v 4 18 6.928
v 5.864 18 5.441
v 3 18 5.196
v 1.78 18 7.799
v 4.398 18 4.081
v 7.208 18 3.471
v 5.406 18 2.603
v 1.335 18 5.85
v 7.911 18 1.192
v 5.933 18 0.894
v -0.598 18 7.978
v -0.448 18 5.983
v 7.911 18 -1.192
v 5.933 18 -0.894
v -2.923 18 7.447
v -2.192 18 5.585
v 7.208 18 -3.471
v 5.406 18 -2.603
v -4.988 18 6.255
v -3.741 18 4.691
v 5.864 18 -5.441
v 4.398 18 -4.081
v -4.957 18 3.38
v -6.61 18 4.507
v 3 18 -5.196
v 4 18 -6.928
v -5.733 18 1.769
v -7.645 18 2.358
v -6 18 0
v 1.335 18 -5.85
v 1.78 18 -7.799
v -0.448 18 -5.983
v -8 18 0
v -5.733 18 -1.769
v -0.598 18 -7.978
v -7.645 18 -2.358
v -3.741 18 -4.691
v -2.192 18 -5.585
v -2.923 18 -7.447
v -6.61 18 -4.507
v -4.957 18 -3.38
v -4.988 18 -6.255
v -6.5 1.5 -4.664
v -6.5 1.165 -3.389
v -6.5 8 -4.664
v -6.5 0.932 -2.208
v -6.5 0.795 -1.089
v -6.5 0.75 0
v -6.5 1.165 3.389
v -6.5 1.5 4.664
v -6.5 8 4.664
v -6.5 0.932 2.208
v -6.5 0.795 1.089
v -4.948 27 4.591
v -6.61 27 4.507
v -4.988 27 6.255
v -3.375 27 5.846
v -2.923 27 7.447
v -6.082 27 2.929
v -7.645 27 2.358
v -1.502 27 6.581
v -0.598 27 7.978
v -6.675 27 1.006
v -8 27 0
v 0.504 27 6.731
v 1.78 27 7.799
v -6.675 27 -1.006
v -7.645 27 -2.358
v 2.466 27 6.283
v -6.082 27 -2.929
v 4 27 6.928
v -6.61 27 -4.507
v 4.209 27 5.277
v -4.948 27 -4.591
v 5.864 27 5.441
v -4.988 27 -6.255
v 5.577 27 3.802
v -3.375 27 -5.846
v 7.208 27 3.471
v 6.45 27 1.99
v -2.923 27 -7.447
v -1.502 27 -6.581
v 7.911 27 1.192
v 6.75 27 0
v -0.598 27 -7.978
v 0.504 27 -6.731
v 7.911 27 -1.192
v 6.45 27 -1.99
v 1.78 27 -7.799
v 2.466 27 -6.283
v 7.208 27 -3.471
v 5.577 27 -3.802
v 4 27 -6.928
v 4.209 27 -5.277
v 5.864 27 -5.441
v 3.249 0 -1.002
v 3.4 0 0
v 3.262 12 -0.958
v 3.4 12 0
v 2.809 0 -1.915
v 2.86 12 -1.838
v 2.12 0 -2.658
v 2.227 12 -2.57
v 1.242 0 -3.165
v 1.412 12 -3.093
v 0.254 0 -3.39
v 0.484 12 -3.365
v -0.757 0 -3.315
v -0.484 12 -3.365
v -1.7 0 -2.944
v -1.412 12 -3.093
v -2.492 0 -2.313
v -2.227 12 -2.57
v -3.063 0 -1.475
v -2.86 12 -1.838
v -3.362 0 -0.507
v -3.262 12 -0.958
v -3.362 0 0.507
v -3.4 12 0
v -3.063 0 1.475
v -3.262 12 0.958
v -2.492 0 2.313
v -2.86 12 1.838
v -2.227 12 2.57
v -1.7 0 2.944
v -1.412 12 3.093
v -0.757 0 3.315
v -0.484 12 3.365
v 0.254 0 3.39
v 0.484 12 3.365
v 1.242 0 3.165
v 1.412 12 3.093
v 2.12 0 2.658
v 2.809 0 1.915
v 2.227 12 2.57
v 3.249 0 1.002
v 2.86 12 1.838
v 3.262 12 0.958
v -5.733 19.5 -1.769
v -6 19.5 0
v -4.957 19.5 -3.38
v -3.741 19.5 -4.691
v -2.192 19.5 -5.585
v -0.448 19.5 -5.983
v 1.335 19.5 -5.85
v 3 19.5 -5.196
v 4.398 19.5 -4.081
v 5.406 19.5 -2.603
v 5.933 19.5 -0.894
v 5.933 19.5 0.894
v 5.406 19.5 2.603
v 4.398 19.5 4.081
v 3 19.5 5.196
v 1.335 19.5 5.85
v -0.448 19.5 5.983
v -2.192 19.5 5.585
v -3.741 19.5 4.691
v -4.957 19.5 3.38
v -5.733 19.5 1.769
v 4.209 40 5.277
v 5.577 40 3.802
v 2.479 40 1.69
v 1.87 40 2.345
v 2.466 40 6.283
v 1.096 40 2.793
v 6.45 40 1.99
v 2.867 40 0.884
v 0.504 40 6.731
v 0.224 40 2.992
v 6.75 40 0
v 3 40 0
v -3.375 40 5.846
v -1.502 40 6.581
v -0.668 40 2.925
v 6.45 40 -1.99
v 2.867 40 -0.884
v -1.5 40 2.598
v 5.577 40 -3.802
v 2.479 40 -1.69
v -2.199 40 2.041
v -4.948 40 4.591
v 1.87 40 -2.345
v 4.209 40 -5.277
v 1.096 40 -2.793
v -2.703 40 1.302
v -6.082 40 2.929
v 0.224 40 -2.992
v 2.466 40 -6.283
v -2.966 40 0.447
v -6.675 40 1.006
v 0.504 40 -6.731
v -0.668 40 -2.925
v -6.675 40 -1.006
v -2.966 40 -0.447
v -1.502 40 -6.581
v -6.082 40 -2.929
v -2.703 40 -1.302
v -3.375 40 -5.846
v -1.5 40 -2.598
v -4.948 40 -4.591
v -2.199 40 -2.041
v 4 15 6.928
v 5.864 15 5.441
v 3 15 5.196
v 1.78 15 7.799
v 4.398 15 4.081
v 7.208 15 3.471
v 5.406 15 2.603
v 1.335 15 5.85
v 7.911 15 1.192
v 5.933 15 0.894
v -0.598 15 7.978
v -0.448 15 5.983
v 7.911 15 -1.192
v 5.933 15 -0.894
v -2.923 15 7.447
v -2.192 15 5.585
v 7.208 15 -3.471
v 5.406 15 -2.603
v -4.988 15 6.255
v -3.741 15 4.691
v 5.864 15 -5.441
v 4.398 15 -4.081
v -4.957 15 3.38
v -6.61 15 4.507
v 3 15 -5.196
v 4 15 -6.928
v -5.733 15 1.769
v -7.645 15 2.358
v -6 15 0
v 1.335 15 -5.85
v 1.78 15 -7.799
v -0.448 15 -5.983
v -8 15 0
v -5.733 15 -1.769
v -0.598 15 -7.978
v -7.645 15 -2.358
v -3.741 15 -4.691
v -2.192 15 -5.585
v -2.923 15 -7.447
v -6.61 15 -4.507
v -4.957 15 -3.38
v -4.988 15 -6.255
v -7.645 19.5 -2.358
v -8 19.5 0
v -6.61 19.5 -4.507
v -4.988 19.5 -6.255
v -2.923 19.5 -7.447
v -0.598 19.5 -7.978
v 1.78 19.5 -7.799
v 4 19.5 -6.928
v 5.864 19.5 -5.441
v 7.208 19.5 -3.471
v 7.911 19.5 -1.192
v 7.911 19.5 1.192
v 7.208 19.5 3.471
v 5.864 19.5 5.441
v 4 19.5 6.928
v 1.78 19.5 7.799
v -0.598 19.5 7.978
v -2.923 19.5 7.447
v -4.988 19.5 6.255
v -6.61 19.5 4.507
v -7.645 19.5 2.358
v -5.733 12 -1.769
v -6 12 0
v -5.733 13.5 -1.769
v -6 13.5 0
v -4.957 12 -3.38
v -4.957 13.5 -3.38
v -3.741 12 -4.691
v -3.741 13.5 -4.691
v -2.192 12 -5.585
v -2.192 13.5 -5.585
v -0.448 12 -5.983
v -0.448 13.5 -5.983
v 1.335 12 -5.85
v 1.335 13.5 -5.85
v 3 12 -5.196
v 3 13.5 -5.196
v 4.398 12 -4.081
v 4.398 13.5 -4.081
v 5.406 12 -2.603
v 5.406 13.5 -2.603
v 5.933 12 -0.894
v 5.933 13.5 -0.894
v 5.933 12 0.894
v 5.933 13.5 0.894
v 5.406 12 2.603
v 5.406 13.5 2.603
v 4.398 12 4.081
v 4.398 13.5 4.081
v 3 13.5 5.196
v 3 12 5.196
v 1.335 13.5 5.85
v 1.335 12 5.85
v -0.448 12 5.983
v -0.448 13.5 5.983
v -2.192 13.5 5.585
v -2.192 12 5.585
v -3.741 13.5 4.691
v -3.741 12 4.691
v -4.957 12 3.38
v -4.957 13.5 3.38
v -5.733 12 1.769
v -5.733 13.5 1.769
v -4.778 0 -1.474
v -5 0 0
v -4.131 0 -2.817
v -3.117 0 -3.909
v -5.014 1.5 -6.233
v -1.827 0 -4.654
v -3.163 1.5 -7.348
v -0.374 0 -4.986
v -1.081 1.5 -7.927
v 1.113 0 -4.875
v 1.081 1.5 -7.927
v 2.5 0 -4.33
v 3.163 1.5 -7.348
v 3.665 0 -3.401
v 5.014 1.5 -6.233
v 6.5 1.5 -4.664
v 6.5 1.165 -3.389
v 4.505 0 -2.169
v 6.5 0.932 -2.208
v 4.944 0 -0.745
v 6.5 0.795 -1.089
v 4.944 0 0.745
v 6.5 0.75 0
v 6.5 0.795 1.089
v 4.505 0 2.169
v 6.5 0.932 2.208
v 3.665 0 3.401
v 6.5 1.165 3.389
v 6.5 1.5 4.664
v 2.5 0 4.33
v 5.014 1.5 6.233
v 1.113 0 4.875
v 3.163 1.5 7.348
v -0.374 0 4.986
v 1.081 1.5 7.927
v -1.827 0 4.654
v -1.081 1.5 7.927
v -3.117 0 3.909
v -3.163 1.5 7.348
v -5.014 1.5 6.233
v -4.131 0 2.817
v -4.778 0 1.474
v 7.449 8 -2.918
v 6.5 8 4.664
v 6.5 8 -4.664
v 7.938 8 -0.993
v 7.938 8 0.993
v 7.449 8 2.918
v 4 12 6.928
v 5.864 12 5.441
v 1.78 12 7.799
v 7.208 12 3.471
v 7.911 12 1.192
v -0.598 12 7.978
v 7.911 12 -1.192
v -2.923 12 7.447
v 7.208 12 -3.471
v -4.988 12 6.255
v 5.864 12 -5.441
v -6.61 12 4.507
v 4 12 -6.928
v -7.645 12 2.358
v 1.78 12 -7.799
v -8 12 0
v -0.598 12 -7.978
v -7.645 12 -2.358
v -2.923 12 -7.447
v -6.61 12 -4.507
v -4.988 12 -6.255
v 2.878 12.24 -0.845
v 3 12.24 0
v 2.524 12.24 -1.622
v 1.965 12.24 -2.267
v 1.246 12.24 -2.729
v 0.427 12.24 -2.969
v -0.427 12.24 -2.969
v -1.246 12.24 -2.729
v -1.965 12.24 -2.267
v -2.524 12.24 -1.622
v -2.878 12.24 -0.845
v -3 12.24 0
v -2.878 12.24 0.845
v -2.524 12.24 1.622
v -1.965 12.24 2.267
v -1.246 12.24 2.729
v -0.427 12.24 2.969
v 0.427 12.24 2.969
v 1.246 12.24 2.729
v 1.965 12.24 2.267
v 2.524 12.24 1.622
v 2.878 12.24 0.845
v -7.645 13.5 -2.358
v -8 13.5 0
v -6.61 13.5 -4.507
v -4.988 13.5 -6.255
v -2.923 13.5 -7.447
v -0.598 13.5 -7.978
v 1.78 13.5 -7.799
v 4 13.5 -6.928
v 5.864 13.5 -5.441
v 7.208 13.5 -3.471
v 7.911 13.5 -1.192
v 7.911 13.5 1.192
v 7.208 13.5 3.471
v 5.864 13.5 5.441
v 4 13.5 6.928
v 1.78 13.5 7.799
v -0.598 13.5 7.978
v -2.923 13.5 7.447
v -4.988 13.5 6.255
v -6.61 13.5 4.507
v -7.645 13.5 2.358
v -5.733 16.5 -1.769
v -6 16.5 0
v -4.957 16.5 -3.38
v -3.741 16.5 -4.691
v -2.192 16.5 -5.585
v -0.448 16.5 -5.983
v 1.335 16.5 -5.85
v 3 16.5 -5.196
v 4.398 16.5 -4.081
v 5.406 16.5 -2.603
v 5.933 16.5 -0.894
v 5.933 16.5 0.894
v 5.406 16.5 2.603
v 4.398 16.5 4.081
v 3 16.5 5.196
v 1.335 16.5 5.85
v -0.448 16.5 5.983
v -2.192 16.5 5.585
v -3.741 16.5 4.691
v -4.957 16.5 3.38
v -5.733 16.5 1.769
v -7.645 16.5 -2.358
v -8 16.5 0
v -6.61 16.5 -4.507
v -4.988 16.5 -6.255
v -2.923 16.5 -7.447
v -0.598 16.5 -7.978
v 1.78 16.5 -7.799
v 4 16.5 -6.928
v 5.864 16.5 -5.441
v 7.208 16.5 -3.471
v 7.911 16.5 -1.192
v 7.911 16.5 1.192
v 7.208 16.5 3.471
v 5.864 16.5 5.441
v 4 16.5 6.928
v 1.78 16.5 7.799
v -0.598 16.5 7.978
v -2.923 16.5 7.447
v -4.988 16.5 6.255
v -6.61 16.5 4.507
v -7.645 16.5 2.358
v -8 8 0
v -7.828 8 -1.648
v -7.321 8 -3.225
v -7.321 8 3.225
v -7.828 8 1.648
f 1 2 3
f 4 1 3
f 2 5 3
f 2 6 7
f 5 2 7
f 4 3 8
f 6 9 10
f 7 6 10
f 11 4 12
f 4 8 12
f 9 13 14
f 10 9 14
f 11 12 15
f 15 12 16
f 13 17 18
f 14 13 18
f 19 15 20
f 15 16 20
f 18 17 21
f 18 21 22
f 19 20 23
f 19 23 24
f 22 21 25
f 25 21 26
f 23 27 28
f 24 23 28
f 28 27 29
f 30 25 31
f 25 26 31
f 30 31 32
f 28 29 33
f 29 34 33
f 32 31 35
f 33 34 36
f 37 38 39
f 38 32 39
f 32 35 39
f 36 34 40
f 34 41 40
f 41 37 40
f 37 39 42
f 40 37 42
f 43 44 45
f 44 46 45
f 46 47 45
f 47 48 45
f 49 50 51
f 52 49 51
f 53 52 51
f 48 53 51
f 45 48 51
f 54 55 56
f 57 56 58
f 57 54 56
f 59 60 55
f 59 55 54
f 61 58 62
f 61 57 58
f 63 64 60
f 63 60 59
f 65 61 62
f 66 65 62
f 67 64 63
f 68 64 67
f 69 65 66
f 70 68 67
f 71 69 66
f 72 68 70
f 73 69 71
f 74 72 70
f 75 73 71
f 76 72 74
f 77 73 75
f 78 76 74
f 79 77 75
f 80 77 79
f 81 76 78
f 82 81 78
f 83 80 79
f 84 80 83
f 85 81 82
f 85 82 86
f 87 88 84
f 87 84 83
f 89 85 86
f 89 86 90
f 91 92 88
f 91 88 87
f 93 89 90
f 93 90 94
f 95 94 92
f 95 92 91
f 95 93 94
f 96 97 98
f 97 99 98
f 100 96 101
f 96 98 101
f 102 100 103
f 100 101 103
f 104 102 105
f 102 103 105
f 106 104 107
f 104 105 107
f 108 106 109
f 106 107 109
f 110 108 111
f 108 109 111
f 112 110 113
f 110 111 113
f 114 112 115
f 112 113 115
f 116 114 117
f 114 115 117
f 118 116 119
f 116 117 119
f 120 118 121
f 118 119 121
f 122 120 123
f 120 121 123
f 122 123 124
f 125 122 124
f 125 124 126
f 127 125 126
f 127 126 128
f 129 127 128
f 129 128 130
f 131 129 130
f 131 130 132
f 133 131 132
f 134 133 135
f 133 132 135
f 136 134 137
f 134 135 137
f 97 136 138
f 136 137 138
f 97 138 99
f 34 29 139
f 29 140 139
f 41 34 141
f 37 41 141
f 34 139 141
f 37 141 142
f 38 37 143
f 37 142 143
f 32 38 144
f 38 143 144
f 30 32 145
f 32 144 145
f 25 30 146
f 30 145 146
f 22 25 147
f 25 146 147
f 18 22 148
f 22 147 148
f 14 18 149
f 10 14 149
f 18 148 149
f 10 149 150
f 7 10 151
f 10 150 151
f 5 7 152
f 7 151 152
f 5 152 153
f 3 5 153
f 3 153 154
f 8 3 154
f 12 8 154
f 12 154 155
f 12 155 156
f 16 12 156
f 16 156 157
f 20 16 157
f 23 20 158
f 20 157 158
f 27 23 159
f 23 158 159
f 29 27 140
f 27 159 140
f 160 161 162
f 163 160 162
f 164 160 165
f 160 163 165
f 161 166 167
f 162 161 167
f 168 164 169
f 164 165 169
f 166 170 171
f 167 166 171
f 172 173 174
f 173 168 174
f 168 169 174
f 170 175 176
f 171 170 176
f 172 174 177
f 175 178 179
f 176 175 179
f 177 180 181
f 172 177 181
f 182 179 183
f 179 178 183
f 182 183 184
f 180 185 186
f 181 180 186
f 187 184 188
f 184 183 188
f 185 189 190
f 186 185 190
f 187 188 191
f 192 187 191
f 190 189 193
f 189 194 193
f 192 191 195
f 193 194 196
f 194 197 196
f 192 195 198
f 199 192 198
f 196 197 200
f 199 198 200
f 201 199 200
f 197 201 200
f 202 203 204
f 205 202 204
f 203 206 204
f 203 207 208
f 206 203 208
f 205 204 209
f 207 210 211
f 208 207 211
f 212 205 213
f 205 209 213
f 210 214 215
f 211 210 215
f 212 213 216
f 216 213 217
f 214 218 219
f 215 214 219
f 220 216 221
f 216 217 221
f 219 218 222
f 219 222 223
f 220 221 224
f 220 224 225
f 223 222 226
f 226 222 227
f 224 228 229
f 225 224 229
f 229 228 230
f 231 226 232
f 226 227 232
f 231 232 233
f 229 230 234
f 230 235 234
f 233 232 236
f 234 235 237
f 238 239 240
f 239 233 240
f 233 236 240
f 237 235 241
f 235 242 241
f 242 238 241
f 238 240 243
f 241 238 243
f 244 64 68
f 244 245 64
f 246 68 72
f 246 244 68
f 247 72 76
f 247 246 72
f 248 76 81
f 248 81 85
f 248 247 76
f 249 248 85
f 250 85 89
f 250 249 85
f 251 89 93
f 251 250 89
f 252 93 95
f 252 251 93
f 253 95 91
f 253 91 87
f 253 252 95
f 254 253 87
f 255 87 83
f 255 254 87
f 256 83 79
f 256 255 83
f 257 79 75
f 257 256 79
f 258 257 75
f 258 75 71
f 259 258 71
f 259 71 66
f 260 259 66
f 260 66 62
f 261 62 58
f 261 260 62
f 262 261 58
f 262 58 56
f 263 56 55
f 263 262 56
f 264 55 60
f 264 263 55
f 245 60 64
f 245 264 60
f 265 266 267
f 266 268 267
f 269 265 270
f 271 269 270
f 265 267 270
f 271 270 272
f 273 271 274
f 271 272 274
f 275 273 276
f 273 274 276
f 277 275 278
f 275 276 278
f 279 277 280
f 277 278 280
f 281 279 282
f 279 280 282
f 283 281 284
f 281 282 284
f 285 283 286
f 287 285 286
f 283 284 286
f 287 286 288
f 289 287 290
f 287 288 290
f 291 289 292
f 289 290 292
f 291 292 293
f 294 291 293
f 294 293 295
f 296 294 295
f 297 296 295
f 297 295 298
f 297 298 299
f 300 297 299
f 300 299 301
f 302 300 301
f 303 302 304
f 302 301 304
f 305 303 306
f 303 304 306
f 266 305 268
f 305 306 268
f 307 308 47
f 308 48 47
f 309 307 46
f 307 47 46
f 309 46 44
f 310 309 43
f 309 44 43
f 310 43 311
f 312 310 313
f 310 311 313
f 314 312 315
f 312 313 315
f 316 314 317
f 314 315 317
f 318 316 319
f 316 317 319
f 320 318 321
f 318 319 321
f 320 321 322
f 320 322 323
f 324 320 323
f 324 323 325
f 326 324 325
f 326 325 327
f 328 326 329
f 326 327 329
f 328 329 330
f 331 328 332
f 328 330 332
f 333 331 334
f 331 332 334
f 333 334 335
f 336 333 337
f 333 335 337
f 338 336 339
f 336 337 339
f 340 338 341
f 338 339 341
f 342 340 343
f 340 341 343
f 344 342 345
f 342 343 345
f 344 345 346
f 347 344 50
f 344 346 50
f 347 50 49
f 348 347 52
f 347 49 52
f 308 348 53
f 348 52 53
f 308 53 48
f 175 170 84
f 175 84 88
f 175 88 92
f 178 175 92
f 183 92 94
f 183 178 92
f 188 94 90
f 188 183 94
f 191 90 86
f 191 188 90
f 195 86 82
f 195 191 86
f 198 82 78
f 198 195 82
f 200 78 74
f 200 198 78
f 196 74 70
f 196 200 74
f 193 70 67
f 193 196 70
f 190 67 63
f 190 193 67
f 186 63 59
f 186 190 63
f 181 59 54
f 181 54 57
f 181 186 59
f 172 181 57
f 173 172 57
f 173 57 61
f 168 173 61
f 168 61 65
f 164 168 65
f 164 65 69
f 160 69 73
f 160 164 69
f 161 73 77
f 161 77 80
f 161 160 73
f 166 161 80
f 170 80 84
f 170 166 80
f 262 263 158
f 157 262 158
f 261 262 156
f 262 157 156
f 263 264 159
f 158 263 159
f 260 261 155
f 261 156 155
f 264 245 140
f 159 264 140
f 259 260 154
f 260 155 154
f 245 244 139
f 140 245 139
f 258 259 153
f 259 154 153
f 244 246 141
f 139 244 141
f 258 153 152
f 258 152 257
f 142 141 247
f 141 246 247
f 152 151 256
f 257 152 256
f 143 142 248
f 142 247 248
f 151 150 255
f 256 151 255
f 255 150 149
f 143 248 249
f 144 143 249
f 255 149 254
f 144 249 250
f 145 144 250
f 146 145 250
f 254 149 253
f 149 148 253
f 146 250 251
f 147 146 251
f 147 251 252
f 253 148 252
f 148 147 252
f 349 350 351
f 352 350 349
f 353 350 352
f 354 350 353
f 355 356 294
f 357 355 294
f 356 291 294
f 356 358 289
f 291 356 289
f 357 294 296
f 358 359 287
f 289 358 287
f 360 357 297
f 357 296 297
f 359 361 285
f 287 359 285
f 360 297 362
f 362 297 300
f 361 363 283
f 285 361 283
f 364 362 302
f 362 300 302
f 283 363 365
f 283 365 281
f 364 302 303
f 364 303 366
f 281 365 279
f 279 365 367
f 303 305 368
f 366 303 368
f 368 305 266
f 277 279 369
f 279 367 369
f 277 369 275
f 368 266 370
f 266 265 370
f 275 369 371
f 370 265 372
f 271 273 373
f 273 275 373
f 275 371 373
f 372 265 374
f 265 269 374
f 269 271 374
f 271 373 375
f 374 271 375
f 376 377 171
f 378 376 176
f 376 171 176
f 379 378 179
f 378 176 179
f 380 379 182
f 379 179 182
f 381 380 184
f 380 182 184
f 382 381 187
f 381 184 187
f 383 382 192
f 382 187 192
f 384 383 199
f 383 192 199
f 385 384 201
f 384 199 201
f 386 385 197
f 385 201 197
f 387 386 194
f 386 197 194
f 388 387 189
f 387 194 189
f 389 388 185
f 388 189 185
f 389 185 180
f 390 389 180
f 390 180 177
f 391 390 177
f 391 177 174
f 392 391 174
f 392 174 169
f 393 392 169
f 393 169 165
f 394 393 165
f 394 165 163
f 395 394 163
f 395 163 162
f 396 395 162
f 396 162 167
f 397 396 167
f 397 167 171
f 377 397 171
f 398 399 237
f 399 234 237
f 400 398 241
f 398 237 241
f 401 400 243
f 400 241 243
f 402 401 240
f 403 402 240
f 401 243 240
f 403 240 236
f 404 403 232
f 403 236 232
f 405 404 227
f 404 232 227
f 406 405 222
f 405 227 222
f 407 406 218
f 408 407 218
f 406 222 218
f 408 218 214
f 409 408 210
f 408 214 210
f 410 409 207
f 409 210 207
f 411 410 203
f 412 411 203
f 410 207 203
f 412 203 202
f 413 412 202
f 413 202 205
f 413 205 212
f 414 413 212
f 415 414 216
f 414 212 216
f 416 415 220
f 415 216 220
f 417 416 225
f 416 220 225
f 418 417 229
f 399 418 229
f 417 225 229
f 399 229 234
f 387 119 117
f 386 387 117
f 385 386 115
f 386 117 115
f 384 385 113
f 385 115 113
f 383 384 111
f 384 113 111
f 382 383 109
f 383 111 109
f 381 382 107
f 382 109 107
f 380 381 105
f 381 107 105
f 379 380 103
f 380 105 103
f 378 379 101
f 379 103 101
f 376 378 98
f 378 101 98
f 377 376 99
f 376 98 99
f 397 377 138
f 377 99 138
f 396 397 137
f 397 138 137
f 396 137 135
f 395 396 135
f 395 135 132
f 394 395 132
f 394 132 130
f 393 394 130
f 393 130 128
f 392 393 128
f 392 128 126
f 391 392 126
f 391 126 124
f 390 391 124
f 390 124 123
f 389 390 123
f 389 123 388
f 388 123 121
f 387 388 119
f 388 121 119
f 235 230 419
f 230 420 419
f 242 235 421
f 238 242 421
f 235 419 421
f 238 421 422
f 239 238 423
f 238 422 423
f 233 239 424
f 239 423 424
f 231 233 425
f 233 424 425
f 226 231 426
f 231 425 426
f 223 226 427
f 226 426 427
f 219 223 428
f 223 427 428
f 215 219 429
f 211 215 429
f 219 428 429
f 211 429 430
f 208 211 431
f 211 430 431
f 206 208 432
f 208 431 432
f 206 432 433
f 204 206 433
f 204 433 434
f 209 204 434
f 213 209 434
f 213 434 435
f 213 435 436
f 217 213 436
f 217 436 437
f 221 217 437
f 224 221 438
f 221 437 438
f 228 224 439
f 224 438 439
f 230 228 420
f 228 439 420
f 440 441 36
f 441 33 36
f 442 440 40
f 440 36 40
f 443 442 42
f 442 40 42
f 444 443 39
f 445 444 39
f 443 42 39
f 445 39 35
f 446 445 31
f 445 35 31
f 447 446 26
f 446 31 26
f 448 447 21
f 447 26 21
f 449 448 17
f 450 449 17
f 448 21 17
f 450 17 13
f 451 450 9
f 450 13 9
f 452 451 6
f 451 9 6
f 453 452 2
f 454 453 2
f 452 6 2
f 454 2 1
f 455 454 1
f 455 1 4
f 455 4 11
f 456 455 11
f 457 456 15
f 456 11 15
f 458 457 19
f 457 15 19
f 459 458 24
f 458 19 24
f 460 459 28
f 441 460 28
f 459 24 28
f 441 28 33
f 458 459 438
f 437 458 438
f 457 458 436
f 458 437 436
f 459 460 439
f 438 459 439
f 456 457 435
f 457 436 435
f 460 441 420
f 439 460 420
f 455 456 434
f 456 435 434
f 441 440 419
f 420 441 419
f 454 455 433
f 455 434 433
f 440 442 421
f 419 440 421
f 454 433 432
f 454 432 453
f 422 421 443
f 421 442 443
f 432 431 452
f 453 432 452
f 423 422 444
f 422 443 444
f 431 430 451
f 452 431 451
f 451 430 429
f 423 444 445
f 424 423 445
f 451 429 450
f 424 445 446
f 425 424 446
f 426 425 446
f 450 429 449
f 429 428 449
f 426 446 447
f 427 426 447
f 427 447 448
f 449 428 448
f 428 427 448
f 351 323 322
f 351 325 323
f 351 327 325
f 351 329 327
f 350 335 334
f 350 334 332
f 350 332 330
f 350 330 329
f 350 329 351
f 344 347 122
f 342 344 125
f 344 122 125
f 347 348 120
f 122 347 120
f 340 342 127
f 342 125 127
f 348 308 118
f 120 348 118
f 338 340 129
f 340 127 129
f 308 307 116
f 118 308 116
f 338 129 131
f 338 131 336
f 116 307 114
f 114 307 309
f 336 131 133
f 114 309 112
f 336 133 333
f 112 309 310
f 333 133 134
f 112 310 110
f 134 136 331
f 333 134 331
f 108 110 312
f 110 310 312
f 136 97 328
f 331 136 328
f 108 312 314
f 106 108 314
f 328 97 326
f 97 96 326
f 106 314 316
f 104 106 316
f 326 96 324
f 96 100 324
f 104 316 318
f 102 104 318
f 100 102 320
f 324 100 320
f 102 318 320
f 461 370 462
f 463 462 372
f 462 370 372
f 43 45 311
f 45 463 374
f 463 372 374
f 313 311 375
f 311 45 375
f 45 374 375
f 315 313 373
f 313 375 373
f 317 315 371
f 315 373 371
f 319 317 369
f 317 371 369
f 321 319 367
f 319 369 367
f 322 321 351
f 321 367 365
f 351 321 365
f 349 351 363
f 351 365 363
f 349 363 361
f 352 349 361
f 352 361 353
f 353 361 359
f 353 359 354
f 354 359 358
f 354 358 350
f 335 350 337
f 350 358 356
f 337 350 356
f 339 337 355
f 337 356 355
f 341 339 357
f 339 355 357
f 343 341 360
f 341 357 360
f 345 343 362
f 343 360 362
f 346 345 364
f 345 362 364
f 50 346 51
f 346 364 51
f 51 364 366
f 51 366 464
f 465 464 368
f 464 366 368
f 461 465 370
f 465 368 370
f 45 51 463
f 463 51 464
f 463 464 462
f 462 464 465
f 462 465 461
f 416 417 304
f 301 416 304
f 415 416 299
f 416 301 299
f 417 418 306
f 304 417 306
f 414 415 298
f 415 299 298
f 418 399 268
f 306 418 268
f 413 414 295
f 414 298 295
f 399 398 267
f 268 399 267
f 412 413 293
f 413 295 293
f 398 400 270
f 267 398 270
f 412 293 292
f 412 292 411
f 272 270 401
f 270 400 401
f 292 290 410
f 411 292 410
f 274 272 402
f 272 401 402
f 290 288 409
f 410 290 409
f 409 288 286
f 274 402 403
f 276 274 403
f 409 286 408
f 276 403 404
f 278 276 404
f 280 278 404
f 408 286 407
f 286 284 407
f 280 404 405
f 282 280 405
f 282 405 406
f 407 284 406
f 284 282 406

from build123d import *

# Parameters (mm, degrees)
TAGLIO_ESTRUSIONE1_REACH             = 10
SCHIZZO2_W                           = 1.5
SCHIZZO2_H                           = 8
TAGLIO_ESTRUSIONE1_DIRECTION_2_REACH = 10
SCHIZZO7_R                           = 3
TAGLIO_ESTRUSIONE2_DEPTH             = 41
FORO_FILETTATO_M8_1_D                = 6.8
FORO_FILETTATO_M8_1_DEPTH            = 12
FORO_FILETTATO_M8_1_TIP              = 2.042926105
SCHIZZO10_OUTSIDE_W                  = 27.192
SCHIZZO10_OUTSIDE_H                  = 27.192
SCHIZZO10_OUTSIDE_R                  = 6.75
TAGLIO_ESTRUSIONE3_DEPTH             = 13


with BuildPart() as part:
    # Schizzo1 → Rivoluzione1 (revolve)
    with BuildSketch(Plane.XY):
        Polygon((0, 0), (-5, 0), (-8, 1.5), (-8, 12), (-6, 12), (-6, 13.5), (-8, 13.5), (-8, 15), (-6, 15), (-6, 16.5), (-8, 16.5), (-8, 18), (-6, 18), (-6, 19.5), (-8, 19.5), (-8, 27), (-8, 40), (0, 40), align=None)
    revolve(axis=Axis((0, 129.407380346, 0), (0, -1, 0)))

    # Schizzo2 → Taglio-Estrusione1 (cut, up to next)
    with BuildSketch(Plane.XY, mode=Mode.PRIVATE) as taglio_estrusione1_sk1:
        with Locations((-7.25, 4)):
            Rectangle(SCHIZZO2_W, SCHIZZO2_H)
    taglio_estrusione1_tool1 = extrude(taglio_estrusione1_sk1.sketch, amount=-TAGLIO_ESTRUSIONE1_REACH, mode=Mode.PRIVATE) & part.part
    add(taglio_estrusione1_tool1.solids().sort_by_distance((-7.25, 4, 0))[0], mode=Mode.SUBTRACT)
    # Schizzo2 → Taglio-Estrusione1 (cut, up to next)
    with BuildSketch(Plane.XY, mode=Mode.PRIVATE) as taglio_estrusione1_sk2:
        with Locations((7.25, 4)):
            Rectangle(SCHIZZO2_W, SCHIZZO2_H)
    taglio_estrusione1_tool2 = extrude(taglio_estrusione1_sk2.sketch, amount=-TAGLIO_ESTRUSIONE1_REACH, mode=Mode.PRIVATE) & part.part
    add(taglio_estrusione1_tool2.solids().sort_by_distance((7.25, 4, 0))[0], mode=Mode.SUBTRACT)

    # Schizzo2 → Taglio-Estrusione1 direction 2 (cut, up to next)
    with BuildSketch(Plane.XY, mode=Mode.PRIVATE) as taglio_estrusione1_direction_2_sk1:
        with Locations((-7.25, 4)):
            Rectangle(SCHIZZO2_W, SCHIZZO2_H)
    taglio_estrusione1_direction_2_tool1 = extrude(taglio_estrusione1_direction_2_sk1.sketch, amount=TAGLIO_ESTRUSIONE1_DIRECTION_2_REACH, mode=Mode.PRIVATE) & part.part
    add(taglio_estrusione1_direction_2_tool1.solids().sort_by_distance((-7.25, 4, 0))[0], mode=Mode.SUBTRACT)
    # Schizzo2 → Taglio-Estrusione1 direction 2 (cut, up to next)
    with BuildSketch(Plane.XY, mode=Mode.PRIVATE) as taglio_estrusione1_direction_2_sk2:
        with Locations((7.25, 4)):
            Rectangle(SCHIZZO2_W, SCHIZZO2_H)
    taglio_estrusione1_direction_2_tool2 = extrude(taglio_estrusione1_direction_2_sk2.sketch, amount=TAGLIO_ESTRUSIONE1_DIRECTION_2_REACH, mode=Mode.PRIVATE) & part.part
    add(taglio_estrusione1_direction_2_tool2.solids().sort_by_distance((7.25, 4, 0))[0], mode=Mode.SUBTRACT)

    # Schizzo7 → Taglio-Estrusione2 (cut, through all)
    with BuildSketch(Plane(origin=(0, 40, 0), x_dir=(1, 0, 0), z_dir=(0, 1, 0))):
        Circle(SCHIZZO7_R)
    extrude(amount=-TAGLIO_ESTRUSIONE2_DEPTH, mode=Mode.SUBTRACT)

    # Foro filettato M8-1
    with Locations(Plane(origin=(0, 0, 0), x_dir=(-1, 0, 0), z_dir=(0, -1, 0))):
        with Locations((0, 0)):
            Hole(FORO_FILETTATO_M8_1_D / 2, depth=FORO_FILETTATO_M8_1_DEPTH)
            with Locations((0, 0, -(FORO_FILETTATO_M8_1_DEPTH + FORO_FILETTATO_M8_1_TIP / 2))):  # 118° drill point
                Cone(0, FORO_FILETTATO_M8_1_D / 2, FORO_FILETTATO_M8_1_TIP, mode=Mode.SUBTRACT)

    # Schizzo10 outside → Taglio-Estrusione3 (cut)
    with BuildSketch(Plane(origin=(0, 40, 0), x_dir=(1, 0, 0), z_dir=(0, 1, 0))):
        Rectangle(SCHIZZO10_OUTSIDE_W, SCHIZZO10_OUTSIDE_H)
        Circle(SCHIZZO10_OUTSIDE_R, mode=Mode.SUBTRACT)
    extrude(amount=-TAGLIO_ESTRUSIONE3_DEPTH, mode=Mode.SUBTRACT)


solid = part.part
